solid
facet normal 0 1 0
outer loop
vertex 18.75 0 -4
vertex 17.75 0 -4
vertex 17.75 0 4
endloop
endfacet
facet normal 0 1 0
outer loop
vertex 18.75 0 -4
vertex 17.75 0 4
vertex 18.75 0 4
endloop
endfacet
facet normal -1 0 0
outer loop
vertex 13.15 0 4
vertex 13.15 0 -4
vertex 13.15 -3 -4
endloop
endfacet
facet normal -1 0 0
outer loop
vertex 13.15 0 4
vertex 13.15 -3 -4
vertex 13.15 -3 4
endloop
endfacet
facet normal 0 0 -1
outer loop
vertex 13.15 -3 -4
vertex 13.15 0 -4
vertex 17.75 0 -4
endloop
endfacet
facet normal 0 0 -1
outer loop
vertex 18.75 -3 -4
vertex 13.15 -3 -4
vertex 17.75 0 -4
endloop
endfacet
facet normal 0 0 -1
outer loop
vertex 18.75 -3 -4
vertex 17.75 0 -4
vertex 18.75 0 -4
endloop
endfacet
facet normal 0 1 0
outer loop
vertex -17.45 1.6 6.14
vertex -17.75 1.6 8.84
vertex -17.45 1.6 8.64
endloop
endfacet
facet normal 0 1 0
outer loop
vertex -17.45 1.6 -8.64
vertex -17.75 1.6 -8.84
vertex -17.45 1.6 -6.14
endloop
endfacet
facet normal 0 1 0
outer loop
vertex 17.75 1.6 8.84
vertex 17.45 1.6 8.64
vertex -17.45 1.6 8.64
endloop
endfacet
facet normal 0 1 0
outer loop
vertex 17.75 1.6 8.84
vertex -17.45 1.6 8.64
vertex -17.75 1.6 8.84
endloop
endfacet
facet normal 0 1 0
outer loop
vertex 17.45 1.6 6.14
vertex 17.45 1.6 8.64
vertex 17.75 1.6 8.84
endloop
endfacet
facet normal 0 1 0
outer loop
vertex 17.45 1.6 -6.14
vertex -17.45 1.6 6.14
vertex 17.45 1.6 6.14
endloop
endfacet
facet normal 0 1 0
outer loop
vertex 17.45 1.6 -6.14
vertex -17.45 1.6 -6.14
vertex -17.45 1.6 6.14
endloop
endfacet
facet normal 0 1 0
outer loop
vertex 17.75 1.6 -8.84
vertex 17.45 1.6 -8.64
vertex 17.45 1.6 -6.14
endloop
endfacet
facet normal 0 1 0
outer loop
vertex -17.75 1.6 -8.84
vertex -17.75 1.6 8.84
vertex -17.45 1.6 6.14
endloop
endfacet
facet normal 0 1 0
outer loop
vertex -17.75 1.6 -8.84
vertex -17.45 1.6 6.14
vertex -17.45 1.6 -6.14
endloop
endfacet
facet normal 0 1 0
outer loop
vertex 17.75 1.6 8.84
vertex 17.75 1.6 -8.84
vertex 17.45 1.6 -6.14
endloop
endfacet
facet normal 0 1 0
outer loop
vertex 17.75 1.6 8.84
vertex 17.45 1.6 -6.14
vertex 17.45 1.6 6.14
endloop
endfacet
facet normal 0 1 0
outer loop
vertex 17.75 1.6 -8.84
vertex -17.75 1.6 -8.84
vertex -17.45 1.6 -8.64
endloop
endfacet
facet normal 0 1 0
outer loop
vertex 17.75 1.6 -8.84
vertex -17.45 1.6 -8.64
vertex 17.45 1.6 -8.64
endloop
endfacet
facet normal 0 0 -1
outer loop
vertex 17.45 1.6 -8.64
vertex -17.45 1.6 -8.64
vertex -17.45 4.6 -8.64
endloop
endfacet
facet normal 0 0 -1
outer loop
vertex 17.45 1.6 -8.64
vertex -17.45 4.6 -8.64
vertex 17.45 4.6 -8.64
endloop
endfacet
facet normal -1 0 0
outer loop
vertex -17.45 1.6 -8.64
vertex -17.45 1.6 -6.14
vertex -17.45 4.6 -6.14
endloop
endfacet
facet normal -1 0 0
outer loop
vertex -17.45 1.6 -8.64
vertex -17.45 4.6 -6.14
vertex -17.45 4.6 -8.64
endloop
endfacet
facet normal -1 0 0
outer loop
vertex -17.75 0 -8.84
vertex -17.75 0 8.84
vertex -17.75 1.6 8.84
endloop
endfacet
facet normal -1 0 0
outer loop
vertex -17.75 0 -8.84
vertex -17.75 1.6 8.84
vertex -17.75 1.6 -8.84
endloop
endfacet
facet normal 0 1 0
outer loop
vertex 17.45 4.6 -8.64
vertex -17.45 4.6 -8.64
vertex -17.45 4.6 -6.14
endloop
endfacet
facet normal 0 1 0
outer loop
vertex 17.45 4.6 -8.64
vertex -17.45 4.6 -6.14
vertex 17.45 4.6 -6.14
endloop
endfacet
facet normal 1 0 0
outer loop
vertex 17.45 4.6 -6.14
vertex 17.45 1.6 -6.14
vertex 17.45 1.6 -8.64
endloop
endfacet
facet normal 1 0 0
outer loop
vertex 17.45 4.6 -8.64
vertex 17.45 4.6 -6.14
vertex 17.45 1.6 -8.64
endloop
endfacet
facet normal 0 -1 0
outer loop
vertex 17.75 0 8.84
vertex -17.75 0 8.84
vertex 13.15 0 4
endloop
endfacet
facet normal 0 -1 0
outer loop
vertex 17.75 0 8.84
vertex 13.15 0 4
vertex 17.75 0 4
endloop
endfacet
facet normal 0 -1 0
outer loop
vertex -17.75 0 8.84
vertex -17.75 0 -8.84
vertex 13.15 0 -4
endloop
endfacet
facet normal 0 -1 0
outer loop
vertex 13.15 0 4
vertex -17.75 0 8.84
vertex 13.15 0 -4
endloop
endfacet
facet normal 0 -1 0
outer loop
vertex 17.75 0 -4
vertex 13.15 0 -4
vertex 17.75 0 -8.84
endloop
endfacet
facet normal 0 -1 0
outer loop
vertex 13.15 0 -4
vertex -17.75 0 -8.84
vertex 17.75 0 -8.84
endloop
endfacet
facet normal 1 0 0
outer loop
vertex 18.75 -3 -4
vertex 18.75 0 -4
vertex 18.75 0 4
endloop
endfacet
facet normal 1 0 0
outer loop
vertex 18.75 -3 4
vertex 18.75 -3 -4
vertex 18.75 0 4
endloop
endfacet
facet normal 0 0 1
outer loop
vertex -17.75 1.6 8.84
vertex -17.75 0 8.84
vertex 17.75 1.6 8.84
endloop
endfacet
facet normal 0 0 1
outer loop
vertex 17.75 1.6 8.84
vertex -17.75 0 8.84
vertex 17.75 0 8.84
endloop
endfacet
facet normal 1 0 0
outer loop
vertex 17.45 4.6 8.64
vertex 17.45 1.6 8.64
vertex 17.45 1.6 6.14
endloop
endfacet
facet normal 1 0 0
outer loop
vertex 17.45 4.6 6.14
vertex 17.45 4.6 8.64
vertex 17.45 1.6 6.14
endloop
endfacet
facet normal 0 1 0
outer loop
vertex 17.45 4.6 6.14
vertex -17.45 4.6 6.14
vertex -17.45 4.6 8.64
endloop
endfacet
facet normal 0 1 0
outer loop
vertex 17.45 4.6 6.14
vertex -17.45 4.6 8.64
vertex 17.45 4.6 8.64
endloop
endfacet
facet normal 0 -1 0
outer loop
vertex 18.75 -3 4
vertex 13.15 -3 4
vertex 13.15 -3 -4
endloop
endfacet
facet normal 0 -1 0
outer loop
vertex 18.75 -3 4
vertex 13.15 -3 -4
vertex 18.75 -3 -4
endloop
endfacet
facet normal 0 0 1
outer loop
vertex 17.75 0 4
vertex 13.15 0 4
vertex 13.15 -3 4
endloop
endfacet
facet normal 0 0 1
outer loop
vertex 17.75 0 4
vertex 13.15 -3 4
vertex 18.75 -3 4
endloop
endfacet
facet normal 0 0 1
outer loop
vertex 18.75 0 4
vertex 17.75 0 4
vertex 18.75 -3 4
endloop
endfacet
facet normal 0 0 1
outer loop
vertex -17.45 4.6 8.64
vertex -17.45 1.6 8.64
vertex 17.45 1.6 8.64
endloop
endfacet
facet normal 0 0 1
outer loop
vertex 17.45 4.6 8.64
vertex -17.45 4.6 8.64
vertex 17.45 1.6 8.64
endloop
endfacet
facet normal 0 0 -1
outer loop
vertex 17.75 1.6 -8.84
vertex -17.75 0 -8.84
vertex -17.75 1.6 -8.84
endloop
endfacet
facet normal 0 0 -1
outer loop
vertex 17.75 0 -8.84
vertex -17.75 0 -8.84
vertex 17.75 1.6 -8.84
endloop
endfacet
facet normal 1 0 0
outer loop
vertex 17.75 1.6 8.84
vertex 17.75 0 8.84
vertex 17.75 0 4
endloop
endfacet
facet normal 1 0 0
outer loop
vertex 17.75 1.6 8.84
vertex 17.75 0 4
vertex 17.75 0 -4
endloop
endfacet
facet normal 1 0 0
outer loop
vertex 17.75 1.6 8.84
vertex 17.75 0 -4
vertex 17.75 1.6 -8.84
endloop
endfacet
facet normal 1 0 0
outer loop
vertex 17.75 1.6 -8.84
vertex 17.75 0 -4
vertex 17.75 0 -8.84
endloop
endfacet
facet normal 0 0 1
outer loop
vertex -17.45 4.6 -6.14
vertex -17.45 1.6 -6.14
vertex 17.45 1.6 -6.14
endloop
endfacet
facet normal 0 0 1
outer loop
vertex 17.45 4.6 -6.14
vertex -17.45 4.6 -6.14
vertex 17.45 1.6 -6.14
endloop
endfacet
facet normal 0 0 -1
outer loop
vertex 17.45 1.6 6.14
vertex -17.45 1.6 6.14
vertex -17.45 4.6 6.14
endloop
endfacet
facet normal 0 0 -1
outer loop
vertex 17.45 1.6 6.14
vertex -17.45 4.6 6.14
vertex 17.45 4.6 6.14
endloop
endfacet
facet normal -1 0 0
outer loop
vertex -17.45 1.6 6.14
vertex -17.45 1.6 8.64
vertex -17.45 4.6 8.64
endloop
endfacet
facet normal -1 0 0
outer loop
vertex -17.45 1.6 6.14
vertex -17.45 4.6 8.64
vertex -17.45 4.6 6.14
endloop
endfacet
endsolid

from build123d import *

# Parameters (mm, degrees)
SKETCH1_W           = 35.5
SKETCH1_H           = 17.68
BOSS_EXTRUDE1_DEPTH = 1.6
SKETCH2_W           = 34.9
SKETCH2_H           = 2.5
BOSS_EXTRUDE2_DEPTH = 3
SKETCH3_W           = 5.6
SKETCH3_H           = 8
BOSS_EXTRUDE3_DEPTH = 3


with BuildPart() as part:
    # Sketch1 → Boss-Extrude1 (new body)
    with BuildSketch(Plane(origin=(0, 0, 0), x_dir=(1, 0, 0), z_dir=(0, 1, 0))):
        Rectangle(SKETCH1_W, SKETCH1_H)
    extrude(amount=BOSS_EXTRUDE1_DEPTH)

    # Sketch2 → Boss-Extrude2 (add)
    with BuildSketch(Plane(origin=(0, 1.6, 0), x_dir=(1, 0, 0), z_dir=(0, 1, 0))):
        with Locations((0, 7.39)):
            Rectangle(SKETCH2_W, SKETCH2_H)
        with Locations((0, -7.39)):
            Rectangle(SKETCH2_W, SKETCH2_H)
    extrude(amount=BOSS_EXTRUDE2_DEPTH)

    # Sketch3 → Boss-Extrude3 (add)
    with BuildSketch(Plane.XZ):
        with Locations((15.95, 0)):
            Rectangle(SKETCH3_W, SKETCH3_H)
    extrude(amount=BOSS_EXTRUDE3_DEPTH)


solid = part.part
